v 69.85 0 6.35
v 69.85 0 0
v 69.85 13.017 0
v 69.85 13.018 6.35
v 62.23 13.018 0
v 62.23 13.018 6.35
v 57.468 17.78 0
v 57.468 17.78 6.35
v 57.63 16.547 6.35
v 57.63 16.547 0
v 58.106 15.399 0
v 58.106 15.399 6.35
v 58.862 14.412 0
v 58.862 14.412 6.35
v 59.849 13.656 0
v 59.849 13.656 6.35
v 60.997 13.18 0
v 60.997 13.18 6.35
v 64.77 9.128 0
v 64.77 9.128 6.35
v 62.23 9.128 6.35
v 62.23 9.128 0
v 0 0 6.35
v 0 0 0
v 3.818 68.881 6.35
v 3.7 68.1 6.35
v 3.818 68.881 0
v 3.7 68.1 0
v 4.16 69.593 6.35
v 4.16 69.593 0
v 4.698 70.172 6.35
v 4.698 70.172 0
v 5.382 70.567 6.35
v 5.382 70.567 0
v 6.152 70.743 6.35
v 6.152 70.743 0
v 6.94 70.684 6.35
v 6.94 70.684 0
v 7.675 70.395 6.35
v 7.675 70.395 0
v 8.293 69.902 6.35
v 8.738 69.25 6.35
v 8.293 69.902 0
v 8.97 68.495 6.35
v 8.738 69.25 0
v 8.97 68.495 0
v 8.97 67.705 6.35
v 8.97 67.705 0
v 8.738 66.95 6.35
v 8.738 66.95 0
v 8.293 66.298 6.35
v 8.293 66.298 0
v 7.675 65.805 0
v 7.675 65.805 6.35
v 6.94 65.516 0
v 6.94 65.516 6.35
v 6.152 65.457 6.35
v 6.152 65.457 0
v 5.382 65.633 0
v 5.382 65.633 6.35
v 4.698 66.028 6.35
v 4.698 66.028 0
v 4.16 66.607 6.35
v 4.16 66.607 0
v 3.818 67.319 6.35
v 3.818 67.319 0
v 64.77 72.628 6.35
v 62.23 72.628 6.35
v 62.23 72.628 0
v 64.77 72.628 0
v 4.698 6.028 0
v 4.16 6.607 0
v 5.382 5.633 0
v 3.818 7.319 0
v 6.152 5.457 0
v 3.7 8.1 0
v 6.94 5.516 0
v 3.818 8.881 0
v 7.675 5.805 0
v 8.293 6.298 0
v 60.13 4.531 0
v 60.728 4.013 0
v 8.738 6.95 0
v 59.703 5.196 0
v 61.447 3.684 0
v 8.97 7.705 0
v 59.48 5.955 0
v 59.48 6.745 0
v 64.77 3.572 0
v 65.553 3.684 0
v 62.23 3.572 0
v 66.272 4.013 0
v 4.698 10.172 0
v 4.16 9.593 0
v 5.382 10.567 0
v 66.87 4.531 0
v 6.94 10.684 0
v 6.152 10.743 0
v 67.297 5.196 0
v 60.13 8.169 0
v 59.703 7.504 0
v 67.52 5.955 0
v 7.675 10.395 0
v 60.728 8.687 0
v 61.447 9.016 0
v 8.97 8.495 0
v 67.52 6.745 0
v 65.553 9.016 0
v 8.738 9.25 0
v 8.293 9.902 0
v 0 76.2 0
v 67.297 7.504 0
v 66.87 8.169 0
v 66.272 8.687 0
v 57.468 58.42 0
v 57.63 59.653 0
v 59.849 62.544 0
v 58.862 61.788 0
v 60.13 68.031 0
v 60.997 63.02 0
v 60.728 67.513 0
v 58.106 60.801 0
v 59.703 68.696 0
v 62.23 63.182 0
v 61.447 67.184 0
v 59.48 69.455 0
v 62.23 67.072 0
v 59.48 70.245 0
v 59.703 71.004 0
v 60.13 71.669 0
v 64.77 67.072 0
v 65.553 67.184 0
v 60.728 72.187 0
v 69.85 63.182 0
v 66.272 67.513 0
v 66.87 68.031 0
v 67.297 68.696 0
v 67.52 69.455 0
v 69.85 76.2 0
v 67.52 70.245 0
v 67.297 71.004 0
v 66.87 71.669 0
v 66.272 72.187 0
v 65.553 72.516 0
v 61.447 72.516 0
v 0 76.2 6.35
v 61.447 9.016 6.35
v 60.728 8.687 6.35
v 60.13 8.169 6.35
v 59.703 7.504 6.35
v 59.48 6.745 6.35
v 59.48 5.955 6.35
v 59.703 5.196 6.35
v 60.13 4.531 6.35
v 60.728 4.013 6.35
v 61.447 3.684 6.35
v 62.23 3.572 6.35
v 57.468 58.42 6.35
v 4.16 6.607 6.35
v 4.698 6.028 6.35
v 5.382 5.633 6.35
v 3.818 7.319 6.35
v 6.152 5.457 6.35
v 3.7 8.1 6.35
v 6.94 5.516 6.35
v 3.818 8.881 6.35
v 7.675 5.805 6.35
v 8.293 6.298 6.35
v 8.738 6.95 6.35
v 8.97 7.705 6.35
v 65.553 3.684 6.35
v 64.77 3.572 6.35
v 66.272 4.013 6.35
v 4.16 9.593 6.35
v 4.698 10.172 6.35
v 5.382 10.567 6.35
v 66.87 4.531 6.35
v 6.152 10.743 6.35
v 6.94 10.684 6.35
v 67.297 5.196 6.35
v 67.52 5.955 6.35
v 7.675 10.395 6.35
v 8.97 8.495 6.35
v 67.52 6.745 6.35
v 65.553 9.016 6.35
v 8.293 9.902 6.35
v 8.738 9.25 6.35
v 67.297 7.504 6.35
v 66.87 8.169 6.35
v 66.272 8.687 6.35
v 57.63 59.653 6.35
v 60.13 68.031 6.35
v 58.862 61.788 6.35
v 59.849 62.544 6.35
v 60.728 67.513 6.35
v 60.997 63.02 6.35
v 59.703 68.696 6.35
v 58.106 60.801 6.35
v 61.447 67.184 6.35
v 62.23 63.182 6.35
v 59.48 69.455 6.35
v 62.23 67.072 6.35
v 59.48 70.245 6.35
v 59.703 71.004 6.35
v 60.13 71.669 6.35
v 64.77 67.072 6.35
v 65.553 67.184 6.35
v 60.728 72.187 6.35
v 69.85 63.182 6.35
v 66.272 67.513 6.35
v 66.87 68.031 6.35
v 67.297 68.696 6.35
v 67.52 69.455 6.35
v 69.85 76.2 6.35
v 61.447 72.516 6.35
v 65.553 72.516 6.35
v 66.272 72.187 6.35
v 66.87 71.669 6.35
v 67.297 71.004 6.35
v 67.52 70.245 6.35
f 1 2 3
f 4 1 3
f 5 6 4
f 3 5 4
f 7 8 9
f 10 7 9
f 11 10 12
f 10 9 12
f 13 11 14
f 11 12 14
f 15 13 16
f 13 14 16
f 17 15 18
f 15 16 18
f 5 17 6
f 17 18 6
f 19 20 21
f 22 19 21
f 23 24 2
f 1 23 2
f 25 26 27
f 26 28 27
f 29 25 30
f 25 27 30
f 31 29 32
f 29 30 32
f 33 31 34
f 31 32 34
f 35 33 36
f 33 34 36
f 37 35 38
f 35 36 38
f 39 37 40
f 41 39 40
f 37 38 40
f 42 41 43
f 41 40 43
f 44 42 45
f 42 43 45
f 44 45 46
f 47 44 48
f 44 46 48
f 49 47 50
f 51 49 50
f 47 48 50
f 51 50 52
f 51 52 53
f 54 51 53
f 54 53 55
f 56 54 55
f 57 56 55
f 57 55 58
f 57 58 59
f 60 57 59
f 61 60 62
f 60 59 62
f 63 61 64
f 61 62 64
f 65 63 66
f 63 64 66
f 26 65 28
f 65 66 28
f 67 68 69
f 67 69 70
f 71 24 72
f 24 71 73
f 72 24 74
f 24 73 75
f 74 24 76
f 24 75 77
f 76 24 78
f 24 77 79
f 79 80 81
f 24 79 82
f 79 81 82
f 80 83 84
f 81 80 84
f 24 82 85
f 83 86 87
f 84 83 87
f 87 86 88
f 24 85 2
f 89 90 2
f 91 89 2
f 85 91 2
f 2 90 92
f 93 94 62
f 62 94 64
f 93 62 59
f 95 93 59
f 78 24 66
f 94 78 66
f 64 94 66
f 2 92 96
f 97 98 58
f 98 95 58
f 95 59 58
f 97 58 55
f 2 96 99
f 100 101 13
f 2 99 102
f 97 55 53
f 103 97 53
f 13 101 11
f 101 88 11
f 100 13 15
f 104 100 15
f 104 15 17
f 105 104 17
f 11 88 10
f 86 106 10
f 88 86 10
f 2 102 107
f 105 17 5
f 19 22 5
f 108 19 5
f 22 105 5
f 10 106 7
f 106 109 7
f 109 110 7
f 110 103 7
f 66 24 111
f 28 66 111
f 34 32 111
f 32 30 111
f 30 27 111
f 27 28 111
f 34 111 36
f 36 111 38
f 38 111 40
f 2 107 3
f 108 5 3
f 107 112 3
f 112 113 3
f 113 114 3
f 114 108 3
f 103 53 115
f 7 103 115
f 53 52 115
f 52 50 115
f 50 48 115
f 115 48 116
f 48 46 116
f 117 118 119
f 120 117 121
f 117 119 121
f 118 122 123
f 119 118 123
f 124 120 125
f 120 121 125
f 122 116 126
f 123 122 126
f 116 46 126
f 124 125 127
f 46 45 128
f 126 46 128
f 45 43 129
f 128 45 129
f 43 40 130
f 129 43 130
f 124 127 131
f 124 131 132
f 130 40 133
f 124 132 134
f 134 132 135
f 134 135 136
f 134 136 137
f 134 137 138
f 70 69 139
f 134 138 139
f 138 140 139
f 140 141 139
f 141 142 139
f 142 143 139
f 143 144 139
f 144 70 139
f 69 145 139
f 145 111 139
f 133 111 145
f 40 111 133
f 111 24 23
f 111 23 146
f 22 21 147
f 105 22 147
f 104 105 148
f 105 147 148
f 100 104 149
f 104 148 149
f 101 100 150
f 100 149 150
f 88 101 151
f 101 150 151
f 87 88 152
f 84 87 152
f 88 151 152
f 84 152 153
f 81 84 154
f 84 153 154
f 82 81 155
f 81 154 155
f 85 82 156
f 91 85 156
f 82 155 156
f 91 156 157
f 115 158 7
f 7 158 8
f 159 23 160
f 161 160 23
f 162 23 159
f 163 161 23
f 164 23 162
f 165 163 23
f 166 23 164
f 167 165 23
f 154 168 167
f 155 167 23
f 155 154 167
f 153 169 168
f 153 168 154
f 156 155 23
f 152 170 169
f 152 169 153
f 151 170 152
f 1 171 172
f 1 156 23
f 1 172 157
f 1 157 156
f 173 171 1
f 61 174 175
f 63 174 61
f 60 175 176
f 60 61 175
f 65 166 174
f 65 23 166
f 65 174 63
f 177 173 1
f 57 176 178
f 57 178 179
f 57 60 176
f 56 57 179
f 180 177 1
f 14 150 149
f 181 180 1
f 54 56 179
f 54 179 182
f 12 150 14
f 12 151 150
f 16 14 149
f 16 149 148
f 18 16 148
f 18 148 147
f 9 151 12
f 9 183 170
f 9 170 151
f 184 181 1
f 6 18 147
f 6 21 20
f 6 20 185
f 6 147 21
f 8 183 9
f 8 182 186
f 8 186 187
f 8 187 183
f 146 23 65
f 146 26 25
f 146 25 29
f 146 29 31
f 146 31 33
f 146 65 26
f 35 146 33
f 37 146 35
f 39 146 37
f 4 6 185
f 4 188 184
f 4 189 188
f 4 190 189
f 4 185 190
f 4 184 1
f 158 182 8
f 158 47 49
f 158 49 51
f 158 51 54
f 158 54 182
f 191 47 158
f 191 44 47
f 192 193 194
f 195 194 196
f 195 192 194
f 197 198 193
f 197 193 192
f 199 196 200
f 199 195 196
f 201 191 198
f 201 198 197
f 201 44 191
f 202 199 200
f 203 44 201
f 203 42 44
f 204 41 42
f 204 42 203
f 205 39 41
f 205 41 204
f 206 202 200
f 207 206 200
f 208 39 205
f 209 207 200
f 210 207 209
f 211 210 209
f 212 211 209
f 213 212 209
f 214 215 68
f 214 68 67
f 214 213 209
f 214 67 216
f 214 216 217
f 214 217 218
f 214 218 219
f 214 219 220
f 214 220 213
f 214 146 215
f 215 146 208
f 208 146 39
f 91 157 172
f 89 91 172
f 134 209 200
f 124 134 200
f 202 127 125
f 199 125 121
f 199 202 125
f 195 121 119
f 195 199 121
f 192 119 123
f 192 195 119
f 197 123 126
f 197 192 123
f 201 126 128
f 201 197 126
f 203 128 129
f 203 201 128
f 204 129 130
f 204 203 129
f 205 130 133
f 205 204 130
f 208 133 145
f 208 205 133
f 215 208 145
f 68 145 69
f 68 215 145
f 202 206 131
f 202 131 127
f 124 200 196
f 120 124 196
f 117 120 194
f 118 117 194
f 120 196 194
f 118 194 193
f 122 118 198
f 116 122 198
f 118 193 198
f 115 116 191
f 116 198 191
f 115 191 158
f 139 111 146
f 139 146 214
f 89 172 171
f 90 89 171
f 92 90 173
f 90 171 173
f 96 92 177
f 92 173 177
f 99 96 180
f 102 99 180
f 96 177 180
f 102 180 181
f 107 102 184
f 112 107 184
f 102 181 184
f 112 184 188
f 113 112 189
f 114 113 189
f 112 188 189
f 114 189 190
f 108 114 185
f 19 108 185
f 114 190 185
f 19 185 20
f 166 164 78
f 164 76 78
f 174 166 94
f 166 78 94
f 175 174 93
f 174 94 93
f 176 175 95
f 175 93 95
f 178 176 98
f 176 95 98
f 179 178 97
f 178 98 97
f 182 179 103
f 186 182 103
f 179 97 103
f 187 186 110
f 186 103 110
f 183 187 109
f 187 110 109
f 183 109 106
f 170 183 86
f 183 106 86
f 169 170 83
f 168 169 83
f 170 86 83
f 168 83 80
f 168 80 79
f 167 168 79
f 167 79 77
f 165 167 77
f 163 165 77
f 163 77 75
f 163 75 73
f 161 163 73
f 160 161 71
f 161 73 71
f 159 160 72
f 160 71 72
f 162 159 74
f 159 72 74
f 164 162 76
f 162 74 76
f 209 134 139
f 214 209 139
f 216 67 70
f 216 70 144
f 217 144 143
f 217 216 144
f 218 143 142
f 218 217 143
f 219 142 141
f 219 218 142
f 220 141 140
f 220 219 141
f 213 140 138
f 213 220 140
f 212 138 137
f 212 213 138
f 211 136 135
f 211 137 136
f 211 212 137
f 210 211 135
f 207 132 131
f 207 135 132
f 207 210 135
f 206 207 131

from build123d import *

# Parameters (mm, degrees)
SKETCH1_W                = 69.85
SKETCH1_H                = 76.2
BOSS_EXTRUDE1_DEPTH      = 6.35
M5_CLEARANCE_HOLE1_D     = 5.3
M5_CLEARANCE_HOLE1_DEPTH = 6.35
M5_CLEARANCE_HOLE1_TIP   = 1.59228064
CUT_EXTRUDE1_DEPTH       = 104.565365832
CUT_EXTRUDE2_DEPTH       = 104.565365832


with BuildPart() as part:
    # Sketch1 → Boss-Extrude1 (new body)
    with BuildSketch(Plane.XY):
        with Locations((34.925, 38.1)):
            Rectangle(SKETCH1_W, SKETCH1_H)
    extrude(amount=BOSS_EXTRUDE1_DEPTH)

    # M5 Clearance Hole1
    with Locations(Plane(origin=(6.35, 68.1, 6.35), x_dir=(1, 0, 0), z_dir=(0, 0, 1))):
        with Locations((0, 0), (0, -60)):
            Hole(M5_CLEARANCE_HOLE1_D / 2, depth=M5_CLEARANCE_HOLE1_DEPTH)
            with Locations((0, 0, -(M5_CLEARANCE_HOLE1_DEPTH + M5_CLEARANCE_HOLE1_TIP / 2))):  # 118° drill point
                Cone(0, M5_CLEARANCE_HOLE1_D / 2, M5_CLEARANCE_HOLE1_TIP, mode=Mode.SUBTRACT)

    # Sketch4 → Cut-Extrude1 (cut, through all)
    with BuildSketch(Plane.XY.offset(6.35)):
        with BuildLine():
            Line((64.77, 67.071875), (62.23, 67.071875))
            ThreePointArc((62.23, 67.071875), (59.451875, 69.85), (62.23, 72.628125))
            Line((62.23, 72.628125), (64.77, 72.628125))
            ThreePointArc((64.77, 72.628125), (67.548125, 69.85), (64.77, 67.071875))
        make_face()
        with BuildLine():
            Line((64.77, 9.128125), (62.23, 9.128125))
            ThreePointArc((62.23, 9.128125), (59.451875, 6.35), (62.23, 3.571875))
            Line((62.23, 3.571875), (64.77, 3.571875))
            ThreePointArc((64.77, 3.571875), (67.548125, 6.35), (64.77, 9.128125))
        make_face()
    extrude(amount=-CUT_EXTRUDE1_DEPTH, mode=Mode.SUBTRACT)

    # Sketch5 → Cut-Extrude2 (cut, through all)
    with BuildSketch(Plane.XY.offset(6.35)):
        with BuildLine():
            Line((66.9925, 17.78), (66.9925, 58.42))
            ThreePointArc((66.9925, 58.42), (62.23, 63.1825), (57.4675, 58.42))
            Line((57.4675, 58.42), (57.4675, 17.78))
            ThreePointArc((57.4675, 17.78), (62.23, 13.0175), (66.9925, 17.78))
        make_face()
        with BuildLine():
            ThreePointArc((66.9925, 17.78), (65.597596045, 14.412403955), (62.23, 13.0175))
            Line((62.23, 13.0175), (69.85, 13.0175))
            Line((69.85, 13.0175), (69.85, 63.1825))
            Line((69.85, 63.1825), (62.23, 63.1825))
            ThreePointArc((62.23, 63.1825), (65.597596045, 61.787596045), (66.9925, 58.42))
            Line((66.9925, 58.42), (66.9925, 17.78))
        make_face()
    extrude(amount=-CUT_EXTRUDE2_DEPTH, mode=Mode.SUBTRACT)


solid = part.part
